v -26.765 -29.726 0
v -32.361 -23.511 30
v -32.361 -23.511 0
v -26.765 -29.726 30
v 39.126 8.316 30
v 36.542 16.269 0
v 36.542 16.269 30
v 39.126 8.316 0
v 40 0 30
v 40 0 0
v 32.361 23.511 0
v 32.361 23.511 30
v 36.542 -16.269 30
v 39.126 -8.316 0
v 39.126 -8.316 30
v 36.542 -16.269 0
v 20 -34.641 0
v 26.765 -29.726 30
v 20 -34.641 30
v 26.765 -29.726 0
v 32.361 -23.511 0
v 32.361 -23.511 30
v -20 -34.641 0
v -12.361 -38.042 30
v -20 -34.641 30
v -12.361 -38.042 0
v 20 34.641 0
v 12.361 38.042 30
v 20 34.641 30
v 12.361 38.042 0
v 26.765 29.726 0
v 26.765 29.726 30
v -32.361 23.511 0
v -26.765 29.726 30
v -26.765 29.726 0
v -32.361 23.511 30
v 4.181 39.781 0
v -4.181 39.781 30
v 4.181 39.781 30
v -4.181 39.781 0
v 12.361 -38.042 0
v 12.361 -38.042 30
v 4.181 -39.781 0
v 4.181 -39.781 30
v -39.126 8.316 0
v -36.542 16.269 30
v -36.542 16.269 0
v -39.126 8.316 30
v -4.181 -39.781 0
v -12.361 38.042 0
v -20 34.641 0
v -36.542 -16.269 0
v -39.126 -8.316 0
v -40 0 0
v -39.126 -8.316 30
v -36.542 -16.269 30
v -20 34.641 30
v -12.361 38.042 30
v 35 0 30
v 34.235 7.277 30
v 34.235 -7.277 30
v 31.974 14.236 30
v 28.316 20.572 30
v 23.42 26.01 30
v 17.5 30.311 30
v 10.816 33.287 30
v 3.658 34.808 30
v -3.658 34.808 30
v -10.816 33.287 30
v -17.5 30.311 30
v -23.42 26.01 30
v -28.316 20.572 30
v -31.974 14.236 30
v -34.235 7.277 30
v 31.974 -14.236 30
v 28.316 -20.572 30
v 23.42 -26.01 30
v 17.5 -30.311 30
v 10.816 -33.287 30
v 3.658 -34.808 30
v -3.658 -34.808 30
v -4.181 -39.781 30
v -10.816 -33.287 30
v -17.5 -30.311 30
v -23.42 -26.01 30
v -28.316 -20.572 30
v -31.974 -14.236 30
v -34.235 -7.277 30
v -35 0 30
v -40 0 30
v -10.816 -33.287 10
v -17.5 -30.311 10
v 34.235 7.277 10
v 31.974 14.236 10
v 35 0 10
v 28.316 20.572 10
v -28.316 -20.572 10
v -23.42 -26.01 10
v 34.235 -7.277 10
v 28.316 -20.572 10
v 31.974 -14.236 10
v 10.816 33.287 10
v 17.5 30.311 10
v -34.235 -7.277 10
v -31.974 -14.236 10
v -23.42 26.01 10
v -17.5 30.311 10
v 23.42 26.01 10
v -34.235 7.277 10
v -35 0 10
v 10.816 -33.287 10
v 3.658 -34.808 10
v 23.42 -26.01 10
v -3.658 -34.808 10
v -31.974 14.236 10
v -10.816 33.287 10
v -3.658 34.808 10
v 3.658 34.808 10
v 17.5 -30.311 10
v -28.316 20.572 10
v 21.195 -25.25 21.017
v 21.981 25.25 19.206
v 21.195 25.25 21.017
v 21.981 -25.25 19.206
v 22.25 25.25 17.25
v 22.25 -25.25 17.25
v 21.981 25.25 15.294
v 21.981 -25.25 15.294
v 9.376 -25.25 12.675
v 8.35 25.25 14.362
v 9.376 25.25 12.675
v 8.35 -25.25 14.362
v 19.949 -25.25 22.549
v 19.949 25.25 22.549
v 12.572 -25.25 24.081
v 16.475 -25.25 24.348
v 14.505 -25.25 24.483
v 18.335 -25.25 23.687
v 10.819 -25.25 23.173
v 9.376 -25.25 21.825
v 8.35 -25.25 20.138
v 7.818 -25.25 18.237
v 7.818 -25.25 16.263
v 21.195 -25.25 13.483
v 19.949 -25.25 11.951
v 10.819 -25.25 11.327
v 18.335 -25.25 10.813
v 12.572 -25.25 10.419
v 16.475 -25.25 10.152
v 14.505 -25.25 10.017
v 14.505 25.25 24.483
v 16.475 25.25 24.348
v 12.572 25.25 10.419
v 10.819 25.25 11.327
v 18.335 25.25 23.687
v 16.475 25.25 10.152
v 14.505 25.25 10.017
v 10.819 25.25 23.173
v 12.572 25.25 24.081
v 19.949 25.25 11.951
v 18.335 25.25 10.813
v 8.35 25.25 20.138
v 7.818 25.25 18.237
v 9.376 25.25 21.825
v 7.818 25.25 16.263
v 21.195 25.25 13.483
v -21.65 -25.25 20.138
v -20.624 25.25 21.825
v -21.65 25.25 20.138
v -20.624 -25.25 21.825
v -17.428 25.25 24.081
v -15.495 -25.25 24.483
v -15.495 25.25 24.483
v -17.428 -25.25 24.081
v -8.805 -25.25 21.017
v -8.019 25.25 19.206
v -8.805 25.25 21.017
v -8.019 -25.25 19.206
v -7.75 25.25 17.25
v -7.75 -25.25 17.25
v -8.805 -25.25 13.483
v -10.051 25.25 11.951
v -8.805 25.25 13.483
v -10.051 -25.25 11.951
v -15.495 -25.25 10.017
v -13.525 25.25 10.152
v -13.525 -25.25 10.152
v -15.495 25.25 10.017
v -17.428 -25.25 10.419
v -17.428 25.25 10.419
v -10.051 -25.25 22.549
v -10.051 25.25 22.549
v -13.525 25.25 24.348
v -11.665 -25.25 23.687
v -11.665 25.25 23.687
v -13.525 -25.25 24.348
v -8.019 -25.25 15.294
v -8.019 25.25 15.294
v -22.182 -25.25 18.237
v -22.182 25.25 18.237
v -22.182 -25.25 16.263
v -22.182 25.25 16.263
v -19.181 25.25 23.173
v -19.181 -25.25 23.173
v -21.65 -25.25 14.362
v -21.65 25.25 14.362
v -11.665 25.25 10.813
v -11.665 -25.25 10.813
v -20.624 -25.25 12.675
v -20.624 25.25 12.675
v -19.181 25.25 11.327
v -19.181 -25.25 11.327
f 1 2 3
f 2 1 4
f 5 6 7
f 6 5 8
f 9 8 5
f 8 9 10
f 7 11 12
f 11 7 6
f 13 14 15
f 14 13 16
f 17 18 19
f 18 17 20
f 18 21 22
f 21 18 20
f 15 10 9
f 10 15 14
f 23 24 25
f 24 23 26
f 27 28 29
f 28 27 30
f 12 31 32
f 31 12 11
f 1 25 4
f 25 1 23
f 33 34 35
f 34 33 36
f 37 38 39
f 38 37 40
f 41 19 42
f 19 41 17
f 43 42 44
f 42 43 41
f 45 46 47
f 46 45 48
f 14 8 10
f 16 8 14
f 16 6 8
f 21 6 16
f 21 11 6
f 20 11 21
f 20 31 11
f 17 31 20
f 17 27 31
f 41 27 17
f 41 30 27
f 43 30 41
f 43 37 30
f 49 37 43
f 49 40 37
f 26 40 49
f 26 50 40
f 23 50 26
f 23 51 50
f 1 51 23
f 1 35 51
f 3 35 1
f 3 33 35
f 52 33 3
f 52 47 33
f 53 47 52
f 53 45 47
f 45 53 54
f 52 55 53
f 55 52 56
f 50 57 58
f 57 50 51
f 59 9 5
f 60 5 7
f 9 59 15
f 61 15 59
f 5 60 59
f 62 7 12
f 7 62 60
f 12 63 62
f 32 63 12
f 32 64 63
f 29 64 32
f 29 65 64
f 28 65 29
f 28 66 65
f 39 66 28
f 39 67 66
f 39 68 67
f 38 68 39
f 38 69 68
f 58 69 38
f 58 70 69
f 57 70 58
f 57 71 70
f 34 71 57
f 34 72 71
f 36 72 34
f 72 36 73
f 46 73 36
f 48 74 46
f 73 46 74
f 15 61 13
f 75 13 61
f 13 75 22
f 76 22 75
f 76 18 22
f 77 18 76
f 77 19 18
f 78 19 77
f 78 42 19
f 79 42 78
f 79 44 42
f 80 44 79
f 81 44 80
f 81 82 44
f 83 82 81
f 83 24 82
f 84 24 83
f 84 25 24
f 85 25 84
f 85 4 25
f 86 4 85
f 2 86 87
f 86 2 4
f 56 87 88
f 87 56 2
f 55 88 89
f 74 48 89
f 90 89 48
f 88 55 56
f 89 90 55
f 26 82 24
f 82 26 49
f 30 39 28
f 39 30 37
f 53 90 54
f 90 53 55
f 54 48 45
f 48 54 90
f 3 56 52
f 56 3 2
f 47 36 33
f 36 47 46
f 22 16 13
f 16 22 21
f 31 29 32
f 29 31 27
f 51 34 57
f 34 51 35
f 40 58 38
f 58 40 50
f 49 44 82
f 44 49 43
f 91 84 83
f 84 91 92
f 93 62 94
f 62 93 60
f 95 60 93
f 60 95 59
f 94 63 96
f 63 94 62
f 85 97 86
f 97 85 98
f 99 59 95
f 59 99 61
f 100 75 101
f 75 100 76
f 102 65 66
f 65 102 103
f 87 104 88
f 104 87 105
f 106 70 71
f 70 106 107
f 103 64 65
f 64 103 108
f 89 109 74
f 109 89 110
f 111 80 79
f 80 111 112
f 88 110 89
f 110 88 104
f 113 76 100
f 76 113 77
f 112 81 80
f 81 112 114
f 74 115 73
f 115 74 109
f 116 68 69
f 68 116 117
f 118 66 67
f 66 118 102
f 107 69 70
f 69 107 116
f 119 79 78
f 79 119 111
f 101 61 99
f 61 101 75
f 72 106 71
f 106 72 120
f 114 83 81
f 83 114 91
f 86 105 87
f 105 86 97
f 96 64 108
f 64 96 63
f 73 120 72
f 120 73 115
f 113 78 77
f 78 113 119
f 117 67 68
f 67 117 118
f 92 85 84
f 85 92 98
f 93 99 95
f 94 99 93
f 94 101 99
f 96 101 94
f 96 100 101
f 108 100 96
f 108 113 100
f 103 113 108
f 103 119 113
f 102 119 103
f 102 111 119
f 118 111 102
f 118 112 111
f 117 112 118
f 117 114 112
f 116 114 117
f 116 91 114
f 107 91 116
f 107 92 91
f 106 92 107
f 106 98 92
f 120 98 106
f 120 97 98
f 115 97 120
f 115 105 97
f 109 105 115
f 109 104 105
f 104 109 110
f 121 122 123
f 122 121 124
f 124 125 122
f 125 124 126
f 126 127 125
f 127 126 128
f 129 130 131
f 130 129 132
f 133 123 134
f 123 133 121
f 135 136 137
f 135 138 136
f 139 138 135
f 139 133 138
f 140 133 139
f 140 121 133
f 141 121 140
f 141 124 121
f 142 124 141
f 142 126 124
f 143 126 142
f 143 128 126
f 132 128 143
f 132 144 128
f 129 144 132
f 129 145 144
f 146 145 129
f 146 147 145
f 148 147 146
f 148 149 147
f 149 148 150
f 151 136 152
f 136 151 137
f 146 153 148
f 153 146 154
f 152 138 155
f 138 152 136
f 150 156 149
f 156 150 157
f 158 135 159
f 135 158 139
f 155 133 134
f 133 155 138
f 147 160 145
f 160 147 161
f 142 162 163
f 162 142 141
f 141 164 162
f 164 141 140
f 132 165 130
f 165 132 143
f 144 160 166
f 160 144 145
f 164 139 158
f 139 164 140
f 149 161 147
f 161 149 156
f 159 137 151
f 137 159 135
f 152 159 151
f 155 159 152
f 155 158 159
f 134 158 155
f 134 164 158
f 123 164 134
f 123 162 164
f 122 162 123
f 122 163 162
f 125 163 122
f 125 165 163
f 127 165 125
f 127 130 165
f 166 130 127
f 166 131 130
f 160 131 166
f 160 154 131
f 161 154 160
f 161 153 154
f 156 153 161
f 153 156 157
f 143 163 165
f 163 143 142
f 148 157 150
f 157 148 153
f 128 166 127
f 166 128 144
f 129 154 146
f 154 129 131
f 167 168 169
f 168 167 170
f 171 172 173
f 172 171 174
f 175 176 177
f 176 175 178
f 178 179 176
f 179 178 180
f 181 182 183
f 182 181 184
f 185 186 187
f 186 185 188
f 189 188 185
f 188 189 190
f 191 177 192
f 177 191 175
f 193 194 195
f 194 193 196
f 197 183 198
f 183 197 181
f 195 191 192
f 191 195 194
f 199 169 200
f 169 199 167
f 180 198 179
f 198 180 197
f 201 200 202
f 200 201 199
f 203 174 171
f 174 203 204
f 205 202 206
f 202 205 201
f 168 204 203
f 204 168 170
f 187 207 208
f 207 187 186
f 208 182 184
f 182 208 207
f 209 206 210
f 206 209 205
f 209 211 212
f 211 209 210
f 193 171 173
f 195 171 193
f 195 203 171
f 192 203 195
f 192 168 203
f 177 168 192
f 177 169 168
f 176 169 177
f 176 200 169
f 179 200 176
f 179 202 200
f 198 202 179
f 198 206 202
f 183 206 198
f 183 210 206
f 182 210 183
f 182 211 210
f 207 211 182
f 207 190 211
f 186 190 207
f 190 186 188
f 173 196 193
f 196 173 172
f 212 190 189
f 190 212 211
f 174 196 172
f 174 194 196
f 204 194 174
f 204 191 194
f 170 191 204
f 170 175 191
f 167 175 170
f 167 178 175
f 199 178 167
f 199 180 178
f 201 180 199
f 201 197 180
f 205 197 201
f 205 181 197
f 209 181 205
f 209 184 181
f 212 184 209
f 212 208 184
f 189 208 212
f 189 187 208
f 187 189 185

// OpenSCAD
difference()
{
    cylinder(d = 80, h = 30);
    translate([0, 0, 10]) cylinder(d = 70, h = 30.1);
}

translate([15, 50.5/2, 10+14.5/2]) rotate([90, 0, 0]) cylinder(d = 14.5, h = 50.5);
translate([-15, 50.5/2, 10+14.5/2]) rotate([90, 0, 0]) cylinder(d = 14.5, h = 50.5);
